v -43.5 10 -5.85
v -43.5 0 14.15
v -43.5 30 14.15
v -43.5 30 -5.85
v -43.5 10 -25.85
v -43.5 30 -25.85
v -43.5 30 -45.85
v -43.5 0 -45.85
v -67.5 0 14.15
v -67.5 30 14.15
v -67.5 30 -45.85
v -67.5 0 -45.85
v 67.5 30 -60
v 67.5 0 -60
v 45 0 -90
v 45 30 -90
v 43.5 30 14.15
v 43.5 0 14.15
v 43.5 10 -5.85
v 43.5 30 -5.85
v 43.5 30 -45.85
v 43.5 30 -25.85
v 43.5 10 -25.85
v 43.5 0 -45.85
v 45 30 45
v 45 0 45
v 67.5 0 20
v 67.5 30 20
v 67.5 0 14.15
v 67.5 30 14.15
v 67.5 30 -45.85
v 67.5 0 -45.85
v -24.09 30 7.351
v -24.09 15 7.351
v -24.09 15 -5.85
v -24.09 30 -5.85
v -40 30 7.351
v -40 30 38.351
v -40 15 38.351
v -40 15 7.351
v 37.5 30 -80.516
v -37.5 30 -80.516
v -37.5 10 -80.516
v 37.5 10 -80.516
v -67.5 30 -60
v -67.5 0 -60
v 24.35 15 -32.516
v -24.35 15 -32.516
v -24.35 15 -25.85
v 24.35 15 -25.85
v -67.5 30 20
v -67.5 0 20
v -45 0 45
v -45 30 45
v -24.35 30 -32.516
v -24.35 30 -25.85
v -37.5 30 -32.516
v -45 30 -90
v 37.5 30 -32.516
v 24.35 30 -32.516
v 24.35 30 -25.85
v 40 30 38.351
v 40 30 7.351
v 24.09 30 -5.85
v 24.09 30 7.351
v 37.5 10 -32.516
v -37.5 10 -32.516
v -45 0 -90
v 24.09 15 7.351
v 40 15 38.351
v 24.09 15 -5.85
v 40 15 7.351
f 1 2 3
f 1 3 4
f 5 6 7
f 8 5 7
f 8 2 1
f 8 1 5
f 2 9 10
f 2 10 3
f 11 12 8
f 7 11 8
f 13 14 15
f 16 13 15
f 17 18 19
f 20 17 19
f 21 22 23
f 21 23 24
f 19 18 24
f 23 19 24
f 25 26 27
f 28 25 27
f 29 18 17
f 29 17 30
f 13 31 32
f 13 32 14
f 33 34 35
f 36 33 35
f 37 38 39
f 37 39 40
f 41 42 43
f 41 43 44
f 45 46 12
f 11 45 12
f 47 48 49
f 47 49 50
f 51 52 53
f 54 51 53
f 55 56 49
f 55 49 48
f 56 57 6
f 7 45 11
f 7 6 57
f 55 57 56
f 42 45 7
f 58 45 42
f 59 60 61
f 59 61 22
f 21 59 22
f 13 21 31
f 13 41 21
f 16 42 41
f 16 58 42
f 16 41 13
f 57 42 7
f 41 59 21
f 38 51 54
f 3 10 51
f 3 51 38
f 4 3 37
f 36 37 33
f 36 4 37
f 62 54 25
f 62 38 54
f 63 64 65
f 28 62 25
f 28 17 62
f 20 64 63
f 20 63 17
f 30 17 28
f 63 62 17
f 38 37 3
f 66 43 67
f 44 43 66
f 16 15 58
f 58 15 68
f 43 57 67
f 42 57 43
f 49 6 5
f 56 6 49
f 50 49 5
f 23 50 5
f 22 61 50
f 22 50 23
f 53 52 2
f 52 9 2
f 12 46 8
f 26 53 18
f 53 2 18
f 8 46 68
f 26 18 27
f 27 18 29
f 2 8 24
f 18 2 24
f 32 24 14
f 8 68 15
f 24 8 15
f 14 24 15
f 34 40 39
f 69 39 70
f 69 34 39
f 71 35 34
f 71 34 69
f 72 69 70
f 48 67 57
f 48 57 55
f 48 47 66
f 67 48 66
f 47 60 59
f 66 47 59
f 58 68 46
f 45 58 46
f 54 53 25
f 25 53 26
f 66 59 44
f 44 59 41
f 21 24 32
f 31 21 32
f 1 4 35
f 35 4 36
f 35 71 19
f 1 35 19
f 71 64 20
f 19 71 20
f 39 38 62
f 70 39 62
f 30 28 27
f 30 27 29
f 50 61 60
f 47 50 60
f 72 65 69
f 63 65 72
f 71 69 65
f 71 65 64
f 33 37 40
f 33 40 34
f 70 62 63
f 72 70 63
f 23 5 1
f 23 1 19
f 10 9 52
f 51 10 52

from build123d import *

# Parameters (mm, degrees)
RESSALTO_EXTRUS_O1_DEPTH   = 30
CORTE_EXTRUS_O1_DEPTH      = 117.431310222
CORTE_EXTRUS_O1_DEPTH_BACK = 117.431310222
ESBO_O3_W                  = 24
ESBO_O3_H                  = 60
ESBO_O4_W                  = 122.227571884
ESBO_O4_H                  = 20
CORTE_EXTRUS_O3_DEPTH      = 20
ESBO_O6_W                  = 80
ESBO_O6_H                  = 31
CORTE_EXTRUS_O5_DEPTH      = 15
ESBO_O8_W                  = 48.18
ESBO_O8_H                  = 13.200484169
CORTE_EXTRUS_O6_DEPTH      = 15
ESBO_O9_W                  = 75
ESBO_O9_H                  = 48
CORTE_EXTRUS_O7_DEPTH      = 20
ESBO_O10_W                 = 48.7
ESBO_O10_H                 = 6.666237126
CORTE_EXTRUS_O8_DEPTH      = 15


with BuildPart() as part:
    # Esboço2 → Ressalto-extrusão1 (new body)
    with BuildSketch(Plane(origin=(0, 0, 0), x_dir=(1, 0, 0), z_dir=(0, 1, 0))):
        Polygon((-45, -45), (45, -45), (67.5, -20), (67.5, 60), (45, 90), (-45, 90), (-67.5, 60), (-67.5, -20), align=None)
    extrude(amount=RESSALTO_EXTRUS_O1_DEPTH)

    # Esboço3 → Corte-extrusão1 (cut, two sides: drawn at the far end of the back side and taken through both)
    with BuildSketch(Plane(origin=(0, 30, 0), x_dir=(1, 0, 0), z_dir=(0, 1, 0)).offset(-CORTE_EXTRUS_O1_DEPTH_BACK)):
        with Locations((-55.5, 15.849651962)):
            Rectangle(ESBO_O3_W, ESBO_O3_H)
        with Locations((55.5, 15.849651962)):
            Rectangle(ESBO_O3_W, ESBO_O3_H)
    extrude(amount=CORTE_EXTRUS_O1_DEPTH + CORTE_EXTRUS_O1_DEPTH_BACK, mode=Mode.SUBTRACT)

    # Esboço4 → Corte-extrusão3 (cut)
    with BuildSketch(Plane(origin=(0, 30, 0), x_dir=(1, 0, 0), z_dir=(0, 1, 0))):
        with Locations((-2.959415656, 15.849651962)):
            Rectangle(ESBO_O4_W, ESBO_O4_H)
    extrude(amount=-CORTE_EXTRUS_O3_DEPTH, mode=Mode.SUBTRACT)

    # Esboço6 → Corte-extrusão5 (cut)
    with BuildSketch(Plane(origin=(0, 30, 0), x_dir=(1, 0, 0), z_dir=(0, 1, 0))):
        with Locations((0, -22.850832207)):
            Rectangle(ESBO_O6_W, ESBO_O6_H)
    extrude(amount=-CORTE_EXTRUS_O5_DEPTH, mode=Mode.SUBTRACT)

    # Esboço8 → Corte-extrusão6 (cut)
    with BuildSketch(Plane(origin=(0, 30, 0), x_dir=(1, 0, 0), z_dir=(0, 1, 0))):
        with Locations((0, -0.750590123)):
            Rectangle(ESBO_O8_W, ESBO_O8_H)
    extrude(amount=-CORTE_EXTRUS_O6_DEPTH, mode=Mode.SUBTRACT)

    # Esboço9 → Corte-extrusão7 (cut)
    with BuildSketch(Plane(origin=(0, 30, 0), x_dir=(1, 0, 0), z_dir=(0, 1, 0))):
        with Locations((0, 56.515889088)):
            Rectangle(ESBO_O9_W, ESBO_O9_H)
    extrude(amount=-CORTE_EXTRUS_O7_DEPTH, mode=Mode.SUBTRACT)

    # Esboço10 → Corte-extrusão8 (cut)
    with BuildSketch(Plane(origin=(0, 30, 0), x_dir=(1, 0, 0), z_dir=(0, 1, 0))):
        with Locations((0, 29.182770525)):
            Rectangle(ESBO_O10_W, ESBO_O10_H)
    extrude(amount=-CORTE_EXTRUS_O8_DEPTH, mode=Mode.SUBTRACT)


solid = part.part
